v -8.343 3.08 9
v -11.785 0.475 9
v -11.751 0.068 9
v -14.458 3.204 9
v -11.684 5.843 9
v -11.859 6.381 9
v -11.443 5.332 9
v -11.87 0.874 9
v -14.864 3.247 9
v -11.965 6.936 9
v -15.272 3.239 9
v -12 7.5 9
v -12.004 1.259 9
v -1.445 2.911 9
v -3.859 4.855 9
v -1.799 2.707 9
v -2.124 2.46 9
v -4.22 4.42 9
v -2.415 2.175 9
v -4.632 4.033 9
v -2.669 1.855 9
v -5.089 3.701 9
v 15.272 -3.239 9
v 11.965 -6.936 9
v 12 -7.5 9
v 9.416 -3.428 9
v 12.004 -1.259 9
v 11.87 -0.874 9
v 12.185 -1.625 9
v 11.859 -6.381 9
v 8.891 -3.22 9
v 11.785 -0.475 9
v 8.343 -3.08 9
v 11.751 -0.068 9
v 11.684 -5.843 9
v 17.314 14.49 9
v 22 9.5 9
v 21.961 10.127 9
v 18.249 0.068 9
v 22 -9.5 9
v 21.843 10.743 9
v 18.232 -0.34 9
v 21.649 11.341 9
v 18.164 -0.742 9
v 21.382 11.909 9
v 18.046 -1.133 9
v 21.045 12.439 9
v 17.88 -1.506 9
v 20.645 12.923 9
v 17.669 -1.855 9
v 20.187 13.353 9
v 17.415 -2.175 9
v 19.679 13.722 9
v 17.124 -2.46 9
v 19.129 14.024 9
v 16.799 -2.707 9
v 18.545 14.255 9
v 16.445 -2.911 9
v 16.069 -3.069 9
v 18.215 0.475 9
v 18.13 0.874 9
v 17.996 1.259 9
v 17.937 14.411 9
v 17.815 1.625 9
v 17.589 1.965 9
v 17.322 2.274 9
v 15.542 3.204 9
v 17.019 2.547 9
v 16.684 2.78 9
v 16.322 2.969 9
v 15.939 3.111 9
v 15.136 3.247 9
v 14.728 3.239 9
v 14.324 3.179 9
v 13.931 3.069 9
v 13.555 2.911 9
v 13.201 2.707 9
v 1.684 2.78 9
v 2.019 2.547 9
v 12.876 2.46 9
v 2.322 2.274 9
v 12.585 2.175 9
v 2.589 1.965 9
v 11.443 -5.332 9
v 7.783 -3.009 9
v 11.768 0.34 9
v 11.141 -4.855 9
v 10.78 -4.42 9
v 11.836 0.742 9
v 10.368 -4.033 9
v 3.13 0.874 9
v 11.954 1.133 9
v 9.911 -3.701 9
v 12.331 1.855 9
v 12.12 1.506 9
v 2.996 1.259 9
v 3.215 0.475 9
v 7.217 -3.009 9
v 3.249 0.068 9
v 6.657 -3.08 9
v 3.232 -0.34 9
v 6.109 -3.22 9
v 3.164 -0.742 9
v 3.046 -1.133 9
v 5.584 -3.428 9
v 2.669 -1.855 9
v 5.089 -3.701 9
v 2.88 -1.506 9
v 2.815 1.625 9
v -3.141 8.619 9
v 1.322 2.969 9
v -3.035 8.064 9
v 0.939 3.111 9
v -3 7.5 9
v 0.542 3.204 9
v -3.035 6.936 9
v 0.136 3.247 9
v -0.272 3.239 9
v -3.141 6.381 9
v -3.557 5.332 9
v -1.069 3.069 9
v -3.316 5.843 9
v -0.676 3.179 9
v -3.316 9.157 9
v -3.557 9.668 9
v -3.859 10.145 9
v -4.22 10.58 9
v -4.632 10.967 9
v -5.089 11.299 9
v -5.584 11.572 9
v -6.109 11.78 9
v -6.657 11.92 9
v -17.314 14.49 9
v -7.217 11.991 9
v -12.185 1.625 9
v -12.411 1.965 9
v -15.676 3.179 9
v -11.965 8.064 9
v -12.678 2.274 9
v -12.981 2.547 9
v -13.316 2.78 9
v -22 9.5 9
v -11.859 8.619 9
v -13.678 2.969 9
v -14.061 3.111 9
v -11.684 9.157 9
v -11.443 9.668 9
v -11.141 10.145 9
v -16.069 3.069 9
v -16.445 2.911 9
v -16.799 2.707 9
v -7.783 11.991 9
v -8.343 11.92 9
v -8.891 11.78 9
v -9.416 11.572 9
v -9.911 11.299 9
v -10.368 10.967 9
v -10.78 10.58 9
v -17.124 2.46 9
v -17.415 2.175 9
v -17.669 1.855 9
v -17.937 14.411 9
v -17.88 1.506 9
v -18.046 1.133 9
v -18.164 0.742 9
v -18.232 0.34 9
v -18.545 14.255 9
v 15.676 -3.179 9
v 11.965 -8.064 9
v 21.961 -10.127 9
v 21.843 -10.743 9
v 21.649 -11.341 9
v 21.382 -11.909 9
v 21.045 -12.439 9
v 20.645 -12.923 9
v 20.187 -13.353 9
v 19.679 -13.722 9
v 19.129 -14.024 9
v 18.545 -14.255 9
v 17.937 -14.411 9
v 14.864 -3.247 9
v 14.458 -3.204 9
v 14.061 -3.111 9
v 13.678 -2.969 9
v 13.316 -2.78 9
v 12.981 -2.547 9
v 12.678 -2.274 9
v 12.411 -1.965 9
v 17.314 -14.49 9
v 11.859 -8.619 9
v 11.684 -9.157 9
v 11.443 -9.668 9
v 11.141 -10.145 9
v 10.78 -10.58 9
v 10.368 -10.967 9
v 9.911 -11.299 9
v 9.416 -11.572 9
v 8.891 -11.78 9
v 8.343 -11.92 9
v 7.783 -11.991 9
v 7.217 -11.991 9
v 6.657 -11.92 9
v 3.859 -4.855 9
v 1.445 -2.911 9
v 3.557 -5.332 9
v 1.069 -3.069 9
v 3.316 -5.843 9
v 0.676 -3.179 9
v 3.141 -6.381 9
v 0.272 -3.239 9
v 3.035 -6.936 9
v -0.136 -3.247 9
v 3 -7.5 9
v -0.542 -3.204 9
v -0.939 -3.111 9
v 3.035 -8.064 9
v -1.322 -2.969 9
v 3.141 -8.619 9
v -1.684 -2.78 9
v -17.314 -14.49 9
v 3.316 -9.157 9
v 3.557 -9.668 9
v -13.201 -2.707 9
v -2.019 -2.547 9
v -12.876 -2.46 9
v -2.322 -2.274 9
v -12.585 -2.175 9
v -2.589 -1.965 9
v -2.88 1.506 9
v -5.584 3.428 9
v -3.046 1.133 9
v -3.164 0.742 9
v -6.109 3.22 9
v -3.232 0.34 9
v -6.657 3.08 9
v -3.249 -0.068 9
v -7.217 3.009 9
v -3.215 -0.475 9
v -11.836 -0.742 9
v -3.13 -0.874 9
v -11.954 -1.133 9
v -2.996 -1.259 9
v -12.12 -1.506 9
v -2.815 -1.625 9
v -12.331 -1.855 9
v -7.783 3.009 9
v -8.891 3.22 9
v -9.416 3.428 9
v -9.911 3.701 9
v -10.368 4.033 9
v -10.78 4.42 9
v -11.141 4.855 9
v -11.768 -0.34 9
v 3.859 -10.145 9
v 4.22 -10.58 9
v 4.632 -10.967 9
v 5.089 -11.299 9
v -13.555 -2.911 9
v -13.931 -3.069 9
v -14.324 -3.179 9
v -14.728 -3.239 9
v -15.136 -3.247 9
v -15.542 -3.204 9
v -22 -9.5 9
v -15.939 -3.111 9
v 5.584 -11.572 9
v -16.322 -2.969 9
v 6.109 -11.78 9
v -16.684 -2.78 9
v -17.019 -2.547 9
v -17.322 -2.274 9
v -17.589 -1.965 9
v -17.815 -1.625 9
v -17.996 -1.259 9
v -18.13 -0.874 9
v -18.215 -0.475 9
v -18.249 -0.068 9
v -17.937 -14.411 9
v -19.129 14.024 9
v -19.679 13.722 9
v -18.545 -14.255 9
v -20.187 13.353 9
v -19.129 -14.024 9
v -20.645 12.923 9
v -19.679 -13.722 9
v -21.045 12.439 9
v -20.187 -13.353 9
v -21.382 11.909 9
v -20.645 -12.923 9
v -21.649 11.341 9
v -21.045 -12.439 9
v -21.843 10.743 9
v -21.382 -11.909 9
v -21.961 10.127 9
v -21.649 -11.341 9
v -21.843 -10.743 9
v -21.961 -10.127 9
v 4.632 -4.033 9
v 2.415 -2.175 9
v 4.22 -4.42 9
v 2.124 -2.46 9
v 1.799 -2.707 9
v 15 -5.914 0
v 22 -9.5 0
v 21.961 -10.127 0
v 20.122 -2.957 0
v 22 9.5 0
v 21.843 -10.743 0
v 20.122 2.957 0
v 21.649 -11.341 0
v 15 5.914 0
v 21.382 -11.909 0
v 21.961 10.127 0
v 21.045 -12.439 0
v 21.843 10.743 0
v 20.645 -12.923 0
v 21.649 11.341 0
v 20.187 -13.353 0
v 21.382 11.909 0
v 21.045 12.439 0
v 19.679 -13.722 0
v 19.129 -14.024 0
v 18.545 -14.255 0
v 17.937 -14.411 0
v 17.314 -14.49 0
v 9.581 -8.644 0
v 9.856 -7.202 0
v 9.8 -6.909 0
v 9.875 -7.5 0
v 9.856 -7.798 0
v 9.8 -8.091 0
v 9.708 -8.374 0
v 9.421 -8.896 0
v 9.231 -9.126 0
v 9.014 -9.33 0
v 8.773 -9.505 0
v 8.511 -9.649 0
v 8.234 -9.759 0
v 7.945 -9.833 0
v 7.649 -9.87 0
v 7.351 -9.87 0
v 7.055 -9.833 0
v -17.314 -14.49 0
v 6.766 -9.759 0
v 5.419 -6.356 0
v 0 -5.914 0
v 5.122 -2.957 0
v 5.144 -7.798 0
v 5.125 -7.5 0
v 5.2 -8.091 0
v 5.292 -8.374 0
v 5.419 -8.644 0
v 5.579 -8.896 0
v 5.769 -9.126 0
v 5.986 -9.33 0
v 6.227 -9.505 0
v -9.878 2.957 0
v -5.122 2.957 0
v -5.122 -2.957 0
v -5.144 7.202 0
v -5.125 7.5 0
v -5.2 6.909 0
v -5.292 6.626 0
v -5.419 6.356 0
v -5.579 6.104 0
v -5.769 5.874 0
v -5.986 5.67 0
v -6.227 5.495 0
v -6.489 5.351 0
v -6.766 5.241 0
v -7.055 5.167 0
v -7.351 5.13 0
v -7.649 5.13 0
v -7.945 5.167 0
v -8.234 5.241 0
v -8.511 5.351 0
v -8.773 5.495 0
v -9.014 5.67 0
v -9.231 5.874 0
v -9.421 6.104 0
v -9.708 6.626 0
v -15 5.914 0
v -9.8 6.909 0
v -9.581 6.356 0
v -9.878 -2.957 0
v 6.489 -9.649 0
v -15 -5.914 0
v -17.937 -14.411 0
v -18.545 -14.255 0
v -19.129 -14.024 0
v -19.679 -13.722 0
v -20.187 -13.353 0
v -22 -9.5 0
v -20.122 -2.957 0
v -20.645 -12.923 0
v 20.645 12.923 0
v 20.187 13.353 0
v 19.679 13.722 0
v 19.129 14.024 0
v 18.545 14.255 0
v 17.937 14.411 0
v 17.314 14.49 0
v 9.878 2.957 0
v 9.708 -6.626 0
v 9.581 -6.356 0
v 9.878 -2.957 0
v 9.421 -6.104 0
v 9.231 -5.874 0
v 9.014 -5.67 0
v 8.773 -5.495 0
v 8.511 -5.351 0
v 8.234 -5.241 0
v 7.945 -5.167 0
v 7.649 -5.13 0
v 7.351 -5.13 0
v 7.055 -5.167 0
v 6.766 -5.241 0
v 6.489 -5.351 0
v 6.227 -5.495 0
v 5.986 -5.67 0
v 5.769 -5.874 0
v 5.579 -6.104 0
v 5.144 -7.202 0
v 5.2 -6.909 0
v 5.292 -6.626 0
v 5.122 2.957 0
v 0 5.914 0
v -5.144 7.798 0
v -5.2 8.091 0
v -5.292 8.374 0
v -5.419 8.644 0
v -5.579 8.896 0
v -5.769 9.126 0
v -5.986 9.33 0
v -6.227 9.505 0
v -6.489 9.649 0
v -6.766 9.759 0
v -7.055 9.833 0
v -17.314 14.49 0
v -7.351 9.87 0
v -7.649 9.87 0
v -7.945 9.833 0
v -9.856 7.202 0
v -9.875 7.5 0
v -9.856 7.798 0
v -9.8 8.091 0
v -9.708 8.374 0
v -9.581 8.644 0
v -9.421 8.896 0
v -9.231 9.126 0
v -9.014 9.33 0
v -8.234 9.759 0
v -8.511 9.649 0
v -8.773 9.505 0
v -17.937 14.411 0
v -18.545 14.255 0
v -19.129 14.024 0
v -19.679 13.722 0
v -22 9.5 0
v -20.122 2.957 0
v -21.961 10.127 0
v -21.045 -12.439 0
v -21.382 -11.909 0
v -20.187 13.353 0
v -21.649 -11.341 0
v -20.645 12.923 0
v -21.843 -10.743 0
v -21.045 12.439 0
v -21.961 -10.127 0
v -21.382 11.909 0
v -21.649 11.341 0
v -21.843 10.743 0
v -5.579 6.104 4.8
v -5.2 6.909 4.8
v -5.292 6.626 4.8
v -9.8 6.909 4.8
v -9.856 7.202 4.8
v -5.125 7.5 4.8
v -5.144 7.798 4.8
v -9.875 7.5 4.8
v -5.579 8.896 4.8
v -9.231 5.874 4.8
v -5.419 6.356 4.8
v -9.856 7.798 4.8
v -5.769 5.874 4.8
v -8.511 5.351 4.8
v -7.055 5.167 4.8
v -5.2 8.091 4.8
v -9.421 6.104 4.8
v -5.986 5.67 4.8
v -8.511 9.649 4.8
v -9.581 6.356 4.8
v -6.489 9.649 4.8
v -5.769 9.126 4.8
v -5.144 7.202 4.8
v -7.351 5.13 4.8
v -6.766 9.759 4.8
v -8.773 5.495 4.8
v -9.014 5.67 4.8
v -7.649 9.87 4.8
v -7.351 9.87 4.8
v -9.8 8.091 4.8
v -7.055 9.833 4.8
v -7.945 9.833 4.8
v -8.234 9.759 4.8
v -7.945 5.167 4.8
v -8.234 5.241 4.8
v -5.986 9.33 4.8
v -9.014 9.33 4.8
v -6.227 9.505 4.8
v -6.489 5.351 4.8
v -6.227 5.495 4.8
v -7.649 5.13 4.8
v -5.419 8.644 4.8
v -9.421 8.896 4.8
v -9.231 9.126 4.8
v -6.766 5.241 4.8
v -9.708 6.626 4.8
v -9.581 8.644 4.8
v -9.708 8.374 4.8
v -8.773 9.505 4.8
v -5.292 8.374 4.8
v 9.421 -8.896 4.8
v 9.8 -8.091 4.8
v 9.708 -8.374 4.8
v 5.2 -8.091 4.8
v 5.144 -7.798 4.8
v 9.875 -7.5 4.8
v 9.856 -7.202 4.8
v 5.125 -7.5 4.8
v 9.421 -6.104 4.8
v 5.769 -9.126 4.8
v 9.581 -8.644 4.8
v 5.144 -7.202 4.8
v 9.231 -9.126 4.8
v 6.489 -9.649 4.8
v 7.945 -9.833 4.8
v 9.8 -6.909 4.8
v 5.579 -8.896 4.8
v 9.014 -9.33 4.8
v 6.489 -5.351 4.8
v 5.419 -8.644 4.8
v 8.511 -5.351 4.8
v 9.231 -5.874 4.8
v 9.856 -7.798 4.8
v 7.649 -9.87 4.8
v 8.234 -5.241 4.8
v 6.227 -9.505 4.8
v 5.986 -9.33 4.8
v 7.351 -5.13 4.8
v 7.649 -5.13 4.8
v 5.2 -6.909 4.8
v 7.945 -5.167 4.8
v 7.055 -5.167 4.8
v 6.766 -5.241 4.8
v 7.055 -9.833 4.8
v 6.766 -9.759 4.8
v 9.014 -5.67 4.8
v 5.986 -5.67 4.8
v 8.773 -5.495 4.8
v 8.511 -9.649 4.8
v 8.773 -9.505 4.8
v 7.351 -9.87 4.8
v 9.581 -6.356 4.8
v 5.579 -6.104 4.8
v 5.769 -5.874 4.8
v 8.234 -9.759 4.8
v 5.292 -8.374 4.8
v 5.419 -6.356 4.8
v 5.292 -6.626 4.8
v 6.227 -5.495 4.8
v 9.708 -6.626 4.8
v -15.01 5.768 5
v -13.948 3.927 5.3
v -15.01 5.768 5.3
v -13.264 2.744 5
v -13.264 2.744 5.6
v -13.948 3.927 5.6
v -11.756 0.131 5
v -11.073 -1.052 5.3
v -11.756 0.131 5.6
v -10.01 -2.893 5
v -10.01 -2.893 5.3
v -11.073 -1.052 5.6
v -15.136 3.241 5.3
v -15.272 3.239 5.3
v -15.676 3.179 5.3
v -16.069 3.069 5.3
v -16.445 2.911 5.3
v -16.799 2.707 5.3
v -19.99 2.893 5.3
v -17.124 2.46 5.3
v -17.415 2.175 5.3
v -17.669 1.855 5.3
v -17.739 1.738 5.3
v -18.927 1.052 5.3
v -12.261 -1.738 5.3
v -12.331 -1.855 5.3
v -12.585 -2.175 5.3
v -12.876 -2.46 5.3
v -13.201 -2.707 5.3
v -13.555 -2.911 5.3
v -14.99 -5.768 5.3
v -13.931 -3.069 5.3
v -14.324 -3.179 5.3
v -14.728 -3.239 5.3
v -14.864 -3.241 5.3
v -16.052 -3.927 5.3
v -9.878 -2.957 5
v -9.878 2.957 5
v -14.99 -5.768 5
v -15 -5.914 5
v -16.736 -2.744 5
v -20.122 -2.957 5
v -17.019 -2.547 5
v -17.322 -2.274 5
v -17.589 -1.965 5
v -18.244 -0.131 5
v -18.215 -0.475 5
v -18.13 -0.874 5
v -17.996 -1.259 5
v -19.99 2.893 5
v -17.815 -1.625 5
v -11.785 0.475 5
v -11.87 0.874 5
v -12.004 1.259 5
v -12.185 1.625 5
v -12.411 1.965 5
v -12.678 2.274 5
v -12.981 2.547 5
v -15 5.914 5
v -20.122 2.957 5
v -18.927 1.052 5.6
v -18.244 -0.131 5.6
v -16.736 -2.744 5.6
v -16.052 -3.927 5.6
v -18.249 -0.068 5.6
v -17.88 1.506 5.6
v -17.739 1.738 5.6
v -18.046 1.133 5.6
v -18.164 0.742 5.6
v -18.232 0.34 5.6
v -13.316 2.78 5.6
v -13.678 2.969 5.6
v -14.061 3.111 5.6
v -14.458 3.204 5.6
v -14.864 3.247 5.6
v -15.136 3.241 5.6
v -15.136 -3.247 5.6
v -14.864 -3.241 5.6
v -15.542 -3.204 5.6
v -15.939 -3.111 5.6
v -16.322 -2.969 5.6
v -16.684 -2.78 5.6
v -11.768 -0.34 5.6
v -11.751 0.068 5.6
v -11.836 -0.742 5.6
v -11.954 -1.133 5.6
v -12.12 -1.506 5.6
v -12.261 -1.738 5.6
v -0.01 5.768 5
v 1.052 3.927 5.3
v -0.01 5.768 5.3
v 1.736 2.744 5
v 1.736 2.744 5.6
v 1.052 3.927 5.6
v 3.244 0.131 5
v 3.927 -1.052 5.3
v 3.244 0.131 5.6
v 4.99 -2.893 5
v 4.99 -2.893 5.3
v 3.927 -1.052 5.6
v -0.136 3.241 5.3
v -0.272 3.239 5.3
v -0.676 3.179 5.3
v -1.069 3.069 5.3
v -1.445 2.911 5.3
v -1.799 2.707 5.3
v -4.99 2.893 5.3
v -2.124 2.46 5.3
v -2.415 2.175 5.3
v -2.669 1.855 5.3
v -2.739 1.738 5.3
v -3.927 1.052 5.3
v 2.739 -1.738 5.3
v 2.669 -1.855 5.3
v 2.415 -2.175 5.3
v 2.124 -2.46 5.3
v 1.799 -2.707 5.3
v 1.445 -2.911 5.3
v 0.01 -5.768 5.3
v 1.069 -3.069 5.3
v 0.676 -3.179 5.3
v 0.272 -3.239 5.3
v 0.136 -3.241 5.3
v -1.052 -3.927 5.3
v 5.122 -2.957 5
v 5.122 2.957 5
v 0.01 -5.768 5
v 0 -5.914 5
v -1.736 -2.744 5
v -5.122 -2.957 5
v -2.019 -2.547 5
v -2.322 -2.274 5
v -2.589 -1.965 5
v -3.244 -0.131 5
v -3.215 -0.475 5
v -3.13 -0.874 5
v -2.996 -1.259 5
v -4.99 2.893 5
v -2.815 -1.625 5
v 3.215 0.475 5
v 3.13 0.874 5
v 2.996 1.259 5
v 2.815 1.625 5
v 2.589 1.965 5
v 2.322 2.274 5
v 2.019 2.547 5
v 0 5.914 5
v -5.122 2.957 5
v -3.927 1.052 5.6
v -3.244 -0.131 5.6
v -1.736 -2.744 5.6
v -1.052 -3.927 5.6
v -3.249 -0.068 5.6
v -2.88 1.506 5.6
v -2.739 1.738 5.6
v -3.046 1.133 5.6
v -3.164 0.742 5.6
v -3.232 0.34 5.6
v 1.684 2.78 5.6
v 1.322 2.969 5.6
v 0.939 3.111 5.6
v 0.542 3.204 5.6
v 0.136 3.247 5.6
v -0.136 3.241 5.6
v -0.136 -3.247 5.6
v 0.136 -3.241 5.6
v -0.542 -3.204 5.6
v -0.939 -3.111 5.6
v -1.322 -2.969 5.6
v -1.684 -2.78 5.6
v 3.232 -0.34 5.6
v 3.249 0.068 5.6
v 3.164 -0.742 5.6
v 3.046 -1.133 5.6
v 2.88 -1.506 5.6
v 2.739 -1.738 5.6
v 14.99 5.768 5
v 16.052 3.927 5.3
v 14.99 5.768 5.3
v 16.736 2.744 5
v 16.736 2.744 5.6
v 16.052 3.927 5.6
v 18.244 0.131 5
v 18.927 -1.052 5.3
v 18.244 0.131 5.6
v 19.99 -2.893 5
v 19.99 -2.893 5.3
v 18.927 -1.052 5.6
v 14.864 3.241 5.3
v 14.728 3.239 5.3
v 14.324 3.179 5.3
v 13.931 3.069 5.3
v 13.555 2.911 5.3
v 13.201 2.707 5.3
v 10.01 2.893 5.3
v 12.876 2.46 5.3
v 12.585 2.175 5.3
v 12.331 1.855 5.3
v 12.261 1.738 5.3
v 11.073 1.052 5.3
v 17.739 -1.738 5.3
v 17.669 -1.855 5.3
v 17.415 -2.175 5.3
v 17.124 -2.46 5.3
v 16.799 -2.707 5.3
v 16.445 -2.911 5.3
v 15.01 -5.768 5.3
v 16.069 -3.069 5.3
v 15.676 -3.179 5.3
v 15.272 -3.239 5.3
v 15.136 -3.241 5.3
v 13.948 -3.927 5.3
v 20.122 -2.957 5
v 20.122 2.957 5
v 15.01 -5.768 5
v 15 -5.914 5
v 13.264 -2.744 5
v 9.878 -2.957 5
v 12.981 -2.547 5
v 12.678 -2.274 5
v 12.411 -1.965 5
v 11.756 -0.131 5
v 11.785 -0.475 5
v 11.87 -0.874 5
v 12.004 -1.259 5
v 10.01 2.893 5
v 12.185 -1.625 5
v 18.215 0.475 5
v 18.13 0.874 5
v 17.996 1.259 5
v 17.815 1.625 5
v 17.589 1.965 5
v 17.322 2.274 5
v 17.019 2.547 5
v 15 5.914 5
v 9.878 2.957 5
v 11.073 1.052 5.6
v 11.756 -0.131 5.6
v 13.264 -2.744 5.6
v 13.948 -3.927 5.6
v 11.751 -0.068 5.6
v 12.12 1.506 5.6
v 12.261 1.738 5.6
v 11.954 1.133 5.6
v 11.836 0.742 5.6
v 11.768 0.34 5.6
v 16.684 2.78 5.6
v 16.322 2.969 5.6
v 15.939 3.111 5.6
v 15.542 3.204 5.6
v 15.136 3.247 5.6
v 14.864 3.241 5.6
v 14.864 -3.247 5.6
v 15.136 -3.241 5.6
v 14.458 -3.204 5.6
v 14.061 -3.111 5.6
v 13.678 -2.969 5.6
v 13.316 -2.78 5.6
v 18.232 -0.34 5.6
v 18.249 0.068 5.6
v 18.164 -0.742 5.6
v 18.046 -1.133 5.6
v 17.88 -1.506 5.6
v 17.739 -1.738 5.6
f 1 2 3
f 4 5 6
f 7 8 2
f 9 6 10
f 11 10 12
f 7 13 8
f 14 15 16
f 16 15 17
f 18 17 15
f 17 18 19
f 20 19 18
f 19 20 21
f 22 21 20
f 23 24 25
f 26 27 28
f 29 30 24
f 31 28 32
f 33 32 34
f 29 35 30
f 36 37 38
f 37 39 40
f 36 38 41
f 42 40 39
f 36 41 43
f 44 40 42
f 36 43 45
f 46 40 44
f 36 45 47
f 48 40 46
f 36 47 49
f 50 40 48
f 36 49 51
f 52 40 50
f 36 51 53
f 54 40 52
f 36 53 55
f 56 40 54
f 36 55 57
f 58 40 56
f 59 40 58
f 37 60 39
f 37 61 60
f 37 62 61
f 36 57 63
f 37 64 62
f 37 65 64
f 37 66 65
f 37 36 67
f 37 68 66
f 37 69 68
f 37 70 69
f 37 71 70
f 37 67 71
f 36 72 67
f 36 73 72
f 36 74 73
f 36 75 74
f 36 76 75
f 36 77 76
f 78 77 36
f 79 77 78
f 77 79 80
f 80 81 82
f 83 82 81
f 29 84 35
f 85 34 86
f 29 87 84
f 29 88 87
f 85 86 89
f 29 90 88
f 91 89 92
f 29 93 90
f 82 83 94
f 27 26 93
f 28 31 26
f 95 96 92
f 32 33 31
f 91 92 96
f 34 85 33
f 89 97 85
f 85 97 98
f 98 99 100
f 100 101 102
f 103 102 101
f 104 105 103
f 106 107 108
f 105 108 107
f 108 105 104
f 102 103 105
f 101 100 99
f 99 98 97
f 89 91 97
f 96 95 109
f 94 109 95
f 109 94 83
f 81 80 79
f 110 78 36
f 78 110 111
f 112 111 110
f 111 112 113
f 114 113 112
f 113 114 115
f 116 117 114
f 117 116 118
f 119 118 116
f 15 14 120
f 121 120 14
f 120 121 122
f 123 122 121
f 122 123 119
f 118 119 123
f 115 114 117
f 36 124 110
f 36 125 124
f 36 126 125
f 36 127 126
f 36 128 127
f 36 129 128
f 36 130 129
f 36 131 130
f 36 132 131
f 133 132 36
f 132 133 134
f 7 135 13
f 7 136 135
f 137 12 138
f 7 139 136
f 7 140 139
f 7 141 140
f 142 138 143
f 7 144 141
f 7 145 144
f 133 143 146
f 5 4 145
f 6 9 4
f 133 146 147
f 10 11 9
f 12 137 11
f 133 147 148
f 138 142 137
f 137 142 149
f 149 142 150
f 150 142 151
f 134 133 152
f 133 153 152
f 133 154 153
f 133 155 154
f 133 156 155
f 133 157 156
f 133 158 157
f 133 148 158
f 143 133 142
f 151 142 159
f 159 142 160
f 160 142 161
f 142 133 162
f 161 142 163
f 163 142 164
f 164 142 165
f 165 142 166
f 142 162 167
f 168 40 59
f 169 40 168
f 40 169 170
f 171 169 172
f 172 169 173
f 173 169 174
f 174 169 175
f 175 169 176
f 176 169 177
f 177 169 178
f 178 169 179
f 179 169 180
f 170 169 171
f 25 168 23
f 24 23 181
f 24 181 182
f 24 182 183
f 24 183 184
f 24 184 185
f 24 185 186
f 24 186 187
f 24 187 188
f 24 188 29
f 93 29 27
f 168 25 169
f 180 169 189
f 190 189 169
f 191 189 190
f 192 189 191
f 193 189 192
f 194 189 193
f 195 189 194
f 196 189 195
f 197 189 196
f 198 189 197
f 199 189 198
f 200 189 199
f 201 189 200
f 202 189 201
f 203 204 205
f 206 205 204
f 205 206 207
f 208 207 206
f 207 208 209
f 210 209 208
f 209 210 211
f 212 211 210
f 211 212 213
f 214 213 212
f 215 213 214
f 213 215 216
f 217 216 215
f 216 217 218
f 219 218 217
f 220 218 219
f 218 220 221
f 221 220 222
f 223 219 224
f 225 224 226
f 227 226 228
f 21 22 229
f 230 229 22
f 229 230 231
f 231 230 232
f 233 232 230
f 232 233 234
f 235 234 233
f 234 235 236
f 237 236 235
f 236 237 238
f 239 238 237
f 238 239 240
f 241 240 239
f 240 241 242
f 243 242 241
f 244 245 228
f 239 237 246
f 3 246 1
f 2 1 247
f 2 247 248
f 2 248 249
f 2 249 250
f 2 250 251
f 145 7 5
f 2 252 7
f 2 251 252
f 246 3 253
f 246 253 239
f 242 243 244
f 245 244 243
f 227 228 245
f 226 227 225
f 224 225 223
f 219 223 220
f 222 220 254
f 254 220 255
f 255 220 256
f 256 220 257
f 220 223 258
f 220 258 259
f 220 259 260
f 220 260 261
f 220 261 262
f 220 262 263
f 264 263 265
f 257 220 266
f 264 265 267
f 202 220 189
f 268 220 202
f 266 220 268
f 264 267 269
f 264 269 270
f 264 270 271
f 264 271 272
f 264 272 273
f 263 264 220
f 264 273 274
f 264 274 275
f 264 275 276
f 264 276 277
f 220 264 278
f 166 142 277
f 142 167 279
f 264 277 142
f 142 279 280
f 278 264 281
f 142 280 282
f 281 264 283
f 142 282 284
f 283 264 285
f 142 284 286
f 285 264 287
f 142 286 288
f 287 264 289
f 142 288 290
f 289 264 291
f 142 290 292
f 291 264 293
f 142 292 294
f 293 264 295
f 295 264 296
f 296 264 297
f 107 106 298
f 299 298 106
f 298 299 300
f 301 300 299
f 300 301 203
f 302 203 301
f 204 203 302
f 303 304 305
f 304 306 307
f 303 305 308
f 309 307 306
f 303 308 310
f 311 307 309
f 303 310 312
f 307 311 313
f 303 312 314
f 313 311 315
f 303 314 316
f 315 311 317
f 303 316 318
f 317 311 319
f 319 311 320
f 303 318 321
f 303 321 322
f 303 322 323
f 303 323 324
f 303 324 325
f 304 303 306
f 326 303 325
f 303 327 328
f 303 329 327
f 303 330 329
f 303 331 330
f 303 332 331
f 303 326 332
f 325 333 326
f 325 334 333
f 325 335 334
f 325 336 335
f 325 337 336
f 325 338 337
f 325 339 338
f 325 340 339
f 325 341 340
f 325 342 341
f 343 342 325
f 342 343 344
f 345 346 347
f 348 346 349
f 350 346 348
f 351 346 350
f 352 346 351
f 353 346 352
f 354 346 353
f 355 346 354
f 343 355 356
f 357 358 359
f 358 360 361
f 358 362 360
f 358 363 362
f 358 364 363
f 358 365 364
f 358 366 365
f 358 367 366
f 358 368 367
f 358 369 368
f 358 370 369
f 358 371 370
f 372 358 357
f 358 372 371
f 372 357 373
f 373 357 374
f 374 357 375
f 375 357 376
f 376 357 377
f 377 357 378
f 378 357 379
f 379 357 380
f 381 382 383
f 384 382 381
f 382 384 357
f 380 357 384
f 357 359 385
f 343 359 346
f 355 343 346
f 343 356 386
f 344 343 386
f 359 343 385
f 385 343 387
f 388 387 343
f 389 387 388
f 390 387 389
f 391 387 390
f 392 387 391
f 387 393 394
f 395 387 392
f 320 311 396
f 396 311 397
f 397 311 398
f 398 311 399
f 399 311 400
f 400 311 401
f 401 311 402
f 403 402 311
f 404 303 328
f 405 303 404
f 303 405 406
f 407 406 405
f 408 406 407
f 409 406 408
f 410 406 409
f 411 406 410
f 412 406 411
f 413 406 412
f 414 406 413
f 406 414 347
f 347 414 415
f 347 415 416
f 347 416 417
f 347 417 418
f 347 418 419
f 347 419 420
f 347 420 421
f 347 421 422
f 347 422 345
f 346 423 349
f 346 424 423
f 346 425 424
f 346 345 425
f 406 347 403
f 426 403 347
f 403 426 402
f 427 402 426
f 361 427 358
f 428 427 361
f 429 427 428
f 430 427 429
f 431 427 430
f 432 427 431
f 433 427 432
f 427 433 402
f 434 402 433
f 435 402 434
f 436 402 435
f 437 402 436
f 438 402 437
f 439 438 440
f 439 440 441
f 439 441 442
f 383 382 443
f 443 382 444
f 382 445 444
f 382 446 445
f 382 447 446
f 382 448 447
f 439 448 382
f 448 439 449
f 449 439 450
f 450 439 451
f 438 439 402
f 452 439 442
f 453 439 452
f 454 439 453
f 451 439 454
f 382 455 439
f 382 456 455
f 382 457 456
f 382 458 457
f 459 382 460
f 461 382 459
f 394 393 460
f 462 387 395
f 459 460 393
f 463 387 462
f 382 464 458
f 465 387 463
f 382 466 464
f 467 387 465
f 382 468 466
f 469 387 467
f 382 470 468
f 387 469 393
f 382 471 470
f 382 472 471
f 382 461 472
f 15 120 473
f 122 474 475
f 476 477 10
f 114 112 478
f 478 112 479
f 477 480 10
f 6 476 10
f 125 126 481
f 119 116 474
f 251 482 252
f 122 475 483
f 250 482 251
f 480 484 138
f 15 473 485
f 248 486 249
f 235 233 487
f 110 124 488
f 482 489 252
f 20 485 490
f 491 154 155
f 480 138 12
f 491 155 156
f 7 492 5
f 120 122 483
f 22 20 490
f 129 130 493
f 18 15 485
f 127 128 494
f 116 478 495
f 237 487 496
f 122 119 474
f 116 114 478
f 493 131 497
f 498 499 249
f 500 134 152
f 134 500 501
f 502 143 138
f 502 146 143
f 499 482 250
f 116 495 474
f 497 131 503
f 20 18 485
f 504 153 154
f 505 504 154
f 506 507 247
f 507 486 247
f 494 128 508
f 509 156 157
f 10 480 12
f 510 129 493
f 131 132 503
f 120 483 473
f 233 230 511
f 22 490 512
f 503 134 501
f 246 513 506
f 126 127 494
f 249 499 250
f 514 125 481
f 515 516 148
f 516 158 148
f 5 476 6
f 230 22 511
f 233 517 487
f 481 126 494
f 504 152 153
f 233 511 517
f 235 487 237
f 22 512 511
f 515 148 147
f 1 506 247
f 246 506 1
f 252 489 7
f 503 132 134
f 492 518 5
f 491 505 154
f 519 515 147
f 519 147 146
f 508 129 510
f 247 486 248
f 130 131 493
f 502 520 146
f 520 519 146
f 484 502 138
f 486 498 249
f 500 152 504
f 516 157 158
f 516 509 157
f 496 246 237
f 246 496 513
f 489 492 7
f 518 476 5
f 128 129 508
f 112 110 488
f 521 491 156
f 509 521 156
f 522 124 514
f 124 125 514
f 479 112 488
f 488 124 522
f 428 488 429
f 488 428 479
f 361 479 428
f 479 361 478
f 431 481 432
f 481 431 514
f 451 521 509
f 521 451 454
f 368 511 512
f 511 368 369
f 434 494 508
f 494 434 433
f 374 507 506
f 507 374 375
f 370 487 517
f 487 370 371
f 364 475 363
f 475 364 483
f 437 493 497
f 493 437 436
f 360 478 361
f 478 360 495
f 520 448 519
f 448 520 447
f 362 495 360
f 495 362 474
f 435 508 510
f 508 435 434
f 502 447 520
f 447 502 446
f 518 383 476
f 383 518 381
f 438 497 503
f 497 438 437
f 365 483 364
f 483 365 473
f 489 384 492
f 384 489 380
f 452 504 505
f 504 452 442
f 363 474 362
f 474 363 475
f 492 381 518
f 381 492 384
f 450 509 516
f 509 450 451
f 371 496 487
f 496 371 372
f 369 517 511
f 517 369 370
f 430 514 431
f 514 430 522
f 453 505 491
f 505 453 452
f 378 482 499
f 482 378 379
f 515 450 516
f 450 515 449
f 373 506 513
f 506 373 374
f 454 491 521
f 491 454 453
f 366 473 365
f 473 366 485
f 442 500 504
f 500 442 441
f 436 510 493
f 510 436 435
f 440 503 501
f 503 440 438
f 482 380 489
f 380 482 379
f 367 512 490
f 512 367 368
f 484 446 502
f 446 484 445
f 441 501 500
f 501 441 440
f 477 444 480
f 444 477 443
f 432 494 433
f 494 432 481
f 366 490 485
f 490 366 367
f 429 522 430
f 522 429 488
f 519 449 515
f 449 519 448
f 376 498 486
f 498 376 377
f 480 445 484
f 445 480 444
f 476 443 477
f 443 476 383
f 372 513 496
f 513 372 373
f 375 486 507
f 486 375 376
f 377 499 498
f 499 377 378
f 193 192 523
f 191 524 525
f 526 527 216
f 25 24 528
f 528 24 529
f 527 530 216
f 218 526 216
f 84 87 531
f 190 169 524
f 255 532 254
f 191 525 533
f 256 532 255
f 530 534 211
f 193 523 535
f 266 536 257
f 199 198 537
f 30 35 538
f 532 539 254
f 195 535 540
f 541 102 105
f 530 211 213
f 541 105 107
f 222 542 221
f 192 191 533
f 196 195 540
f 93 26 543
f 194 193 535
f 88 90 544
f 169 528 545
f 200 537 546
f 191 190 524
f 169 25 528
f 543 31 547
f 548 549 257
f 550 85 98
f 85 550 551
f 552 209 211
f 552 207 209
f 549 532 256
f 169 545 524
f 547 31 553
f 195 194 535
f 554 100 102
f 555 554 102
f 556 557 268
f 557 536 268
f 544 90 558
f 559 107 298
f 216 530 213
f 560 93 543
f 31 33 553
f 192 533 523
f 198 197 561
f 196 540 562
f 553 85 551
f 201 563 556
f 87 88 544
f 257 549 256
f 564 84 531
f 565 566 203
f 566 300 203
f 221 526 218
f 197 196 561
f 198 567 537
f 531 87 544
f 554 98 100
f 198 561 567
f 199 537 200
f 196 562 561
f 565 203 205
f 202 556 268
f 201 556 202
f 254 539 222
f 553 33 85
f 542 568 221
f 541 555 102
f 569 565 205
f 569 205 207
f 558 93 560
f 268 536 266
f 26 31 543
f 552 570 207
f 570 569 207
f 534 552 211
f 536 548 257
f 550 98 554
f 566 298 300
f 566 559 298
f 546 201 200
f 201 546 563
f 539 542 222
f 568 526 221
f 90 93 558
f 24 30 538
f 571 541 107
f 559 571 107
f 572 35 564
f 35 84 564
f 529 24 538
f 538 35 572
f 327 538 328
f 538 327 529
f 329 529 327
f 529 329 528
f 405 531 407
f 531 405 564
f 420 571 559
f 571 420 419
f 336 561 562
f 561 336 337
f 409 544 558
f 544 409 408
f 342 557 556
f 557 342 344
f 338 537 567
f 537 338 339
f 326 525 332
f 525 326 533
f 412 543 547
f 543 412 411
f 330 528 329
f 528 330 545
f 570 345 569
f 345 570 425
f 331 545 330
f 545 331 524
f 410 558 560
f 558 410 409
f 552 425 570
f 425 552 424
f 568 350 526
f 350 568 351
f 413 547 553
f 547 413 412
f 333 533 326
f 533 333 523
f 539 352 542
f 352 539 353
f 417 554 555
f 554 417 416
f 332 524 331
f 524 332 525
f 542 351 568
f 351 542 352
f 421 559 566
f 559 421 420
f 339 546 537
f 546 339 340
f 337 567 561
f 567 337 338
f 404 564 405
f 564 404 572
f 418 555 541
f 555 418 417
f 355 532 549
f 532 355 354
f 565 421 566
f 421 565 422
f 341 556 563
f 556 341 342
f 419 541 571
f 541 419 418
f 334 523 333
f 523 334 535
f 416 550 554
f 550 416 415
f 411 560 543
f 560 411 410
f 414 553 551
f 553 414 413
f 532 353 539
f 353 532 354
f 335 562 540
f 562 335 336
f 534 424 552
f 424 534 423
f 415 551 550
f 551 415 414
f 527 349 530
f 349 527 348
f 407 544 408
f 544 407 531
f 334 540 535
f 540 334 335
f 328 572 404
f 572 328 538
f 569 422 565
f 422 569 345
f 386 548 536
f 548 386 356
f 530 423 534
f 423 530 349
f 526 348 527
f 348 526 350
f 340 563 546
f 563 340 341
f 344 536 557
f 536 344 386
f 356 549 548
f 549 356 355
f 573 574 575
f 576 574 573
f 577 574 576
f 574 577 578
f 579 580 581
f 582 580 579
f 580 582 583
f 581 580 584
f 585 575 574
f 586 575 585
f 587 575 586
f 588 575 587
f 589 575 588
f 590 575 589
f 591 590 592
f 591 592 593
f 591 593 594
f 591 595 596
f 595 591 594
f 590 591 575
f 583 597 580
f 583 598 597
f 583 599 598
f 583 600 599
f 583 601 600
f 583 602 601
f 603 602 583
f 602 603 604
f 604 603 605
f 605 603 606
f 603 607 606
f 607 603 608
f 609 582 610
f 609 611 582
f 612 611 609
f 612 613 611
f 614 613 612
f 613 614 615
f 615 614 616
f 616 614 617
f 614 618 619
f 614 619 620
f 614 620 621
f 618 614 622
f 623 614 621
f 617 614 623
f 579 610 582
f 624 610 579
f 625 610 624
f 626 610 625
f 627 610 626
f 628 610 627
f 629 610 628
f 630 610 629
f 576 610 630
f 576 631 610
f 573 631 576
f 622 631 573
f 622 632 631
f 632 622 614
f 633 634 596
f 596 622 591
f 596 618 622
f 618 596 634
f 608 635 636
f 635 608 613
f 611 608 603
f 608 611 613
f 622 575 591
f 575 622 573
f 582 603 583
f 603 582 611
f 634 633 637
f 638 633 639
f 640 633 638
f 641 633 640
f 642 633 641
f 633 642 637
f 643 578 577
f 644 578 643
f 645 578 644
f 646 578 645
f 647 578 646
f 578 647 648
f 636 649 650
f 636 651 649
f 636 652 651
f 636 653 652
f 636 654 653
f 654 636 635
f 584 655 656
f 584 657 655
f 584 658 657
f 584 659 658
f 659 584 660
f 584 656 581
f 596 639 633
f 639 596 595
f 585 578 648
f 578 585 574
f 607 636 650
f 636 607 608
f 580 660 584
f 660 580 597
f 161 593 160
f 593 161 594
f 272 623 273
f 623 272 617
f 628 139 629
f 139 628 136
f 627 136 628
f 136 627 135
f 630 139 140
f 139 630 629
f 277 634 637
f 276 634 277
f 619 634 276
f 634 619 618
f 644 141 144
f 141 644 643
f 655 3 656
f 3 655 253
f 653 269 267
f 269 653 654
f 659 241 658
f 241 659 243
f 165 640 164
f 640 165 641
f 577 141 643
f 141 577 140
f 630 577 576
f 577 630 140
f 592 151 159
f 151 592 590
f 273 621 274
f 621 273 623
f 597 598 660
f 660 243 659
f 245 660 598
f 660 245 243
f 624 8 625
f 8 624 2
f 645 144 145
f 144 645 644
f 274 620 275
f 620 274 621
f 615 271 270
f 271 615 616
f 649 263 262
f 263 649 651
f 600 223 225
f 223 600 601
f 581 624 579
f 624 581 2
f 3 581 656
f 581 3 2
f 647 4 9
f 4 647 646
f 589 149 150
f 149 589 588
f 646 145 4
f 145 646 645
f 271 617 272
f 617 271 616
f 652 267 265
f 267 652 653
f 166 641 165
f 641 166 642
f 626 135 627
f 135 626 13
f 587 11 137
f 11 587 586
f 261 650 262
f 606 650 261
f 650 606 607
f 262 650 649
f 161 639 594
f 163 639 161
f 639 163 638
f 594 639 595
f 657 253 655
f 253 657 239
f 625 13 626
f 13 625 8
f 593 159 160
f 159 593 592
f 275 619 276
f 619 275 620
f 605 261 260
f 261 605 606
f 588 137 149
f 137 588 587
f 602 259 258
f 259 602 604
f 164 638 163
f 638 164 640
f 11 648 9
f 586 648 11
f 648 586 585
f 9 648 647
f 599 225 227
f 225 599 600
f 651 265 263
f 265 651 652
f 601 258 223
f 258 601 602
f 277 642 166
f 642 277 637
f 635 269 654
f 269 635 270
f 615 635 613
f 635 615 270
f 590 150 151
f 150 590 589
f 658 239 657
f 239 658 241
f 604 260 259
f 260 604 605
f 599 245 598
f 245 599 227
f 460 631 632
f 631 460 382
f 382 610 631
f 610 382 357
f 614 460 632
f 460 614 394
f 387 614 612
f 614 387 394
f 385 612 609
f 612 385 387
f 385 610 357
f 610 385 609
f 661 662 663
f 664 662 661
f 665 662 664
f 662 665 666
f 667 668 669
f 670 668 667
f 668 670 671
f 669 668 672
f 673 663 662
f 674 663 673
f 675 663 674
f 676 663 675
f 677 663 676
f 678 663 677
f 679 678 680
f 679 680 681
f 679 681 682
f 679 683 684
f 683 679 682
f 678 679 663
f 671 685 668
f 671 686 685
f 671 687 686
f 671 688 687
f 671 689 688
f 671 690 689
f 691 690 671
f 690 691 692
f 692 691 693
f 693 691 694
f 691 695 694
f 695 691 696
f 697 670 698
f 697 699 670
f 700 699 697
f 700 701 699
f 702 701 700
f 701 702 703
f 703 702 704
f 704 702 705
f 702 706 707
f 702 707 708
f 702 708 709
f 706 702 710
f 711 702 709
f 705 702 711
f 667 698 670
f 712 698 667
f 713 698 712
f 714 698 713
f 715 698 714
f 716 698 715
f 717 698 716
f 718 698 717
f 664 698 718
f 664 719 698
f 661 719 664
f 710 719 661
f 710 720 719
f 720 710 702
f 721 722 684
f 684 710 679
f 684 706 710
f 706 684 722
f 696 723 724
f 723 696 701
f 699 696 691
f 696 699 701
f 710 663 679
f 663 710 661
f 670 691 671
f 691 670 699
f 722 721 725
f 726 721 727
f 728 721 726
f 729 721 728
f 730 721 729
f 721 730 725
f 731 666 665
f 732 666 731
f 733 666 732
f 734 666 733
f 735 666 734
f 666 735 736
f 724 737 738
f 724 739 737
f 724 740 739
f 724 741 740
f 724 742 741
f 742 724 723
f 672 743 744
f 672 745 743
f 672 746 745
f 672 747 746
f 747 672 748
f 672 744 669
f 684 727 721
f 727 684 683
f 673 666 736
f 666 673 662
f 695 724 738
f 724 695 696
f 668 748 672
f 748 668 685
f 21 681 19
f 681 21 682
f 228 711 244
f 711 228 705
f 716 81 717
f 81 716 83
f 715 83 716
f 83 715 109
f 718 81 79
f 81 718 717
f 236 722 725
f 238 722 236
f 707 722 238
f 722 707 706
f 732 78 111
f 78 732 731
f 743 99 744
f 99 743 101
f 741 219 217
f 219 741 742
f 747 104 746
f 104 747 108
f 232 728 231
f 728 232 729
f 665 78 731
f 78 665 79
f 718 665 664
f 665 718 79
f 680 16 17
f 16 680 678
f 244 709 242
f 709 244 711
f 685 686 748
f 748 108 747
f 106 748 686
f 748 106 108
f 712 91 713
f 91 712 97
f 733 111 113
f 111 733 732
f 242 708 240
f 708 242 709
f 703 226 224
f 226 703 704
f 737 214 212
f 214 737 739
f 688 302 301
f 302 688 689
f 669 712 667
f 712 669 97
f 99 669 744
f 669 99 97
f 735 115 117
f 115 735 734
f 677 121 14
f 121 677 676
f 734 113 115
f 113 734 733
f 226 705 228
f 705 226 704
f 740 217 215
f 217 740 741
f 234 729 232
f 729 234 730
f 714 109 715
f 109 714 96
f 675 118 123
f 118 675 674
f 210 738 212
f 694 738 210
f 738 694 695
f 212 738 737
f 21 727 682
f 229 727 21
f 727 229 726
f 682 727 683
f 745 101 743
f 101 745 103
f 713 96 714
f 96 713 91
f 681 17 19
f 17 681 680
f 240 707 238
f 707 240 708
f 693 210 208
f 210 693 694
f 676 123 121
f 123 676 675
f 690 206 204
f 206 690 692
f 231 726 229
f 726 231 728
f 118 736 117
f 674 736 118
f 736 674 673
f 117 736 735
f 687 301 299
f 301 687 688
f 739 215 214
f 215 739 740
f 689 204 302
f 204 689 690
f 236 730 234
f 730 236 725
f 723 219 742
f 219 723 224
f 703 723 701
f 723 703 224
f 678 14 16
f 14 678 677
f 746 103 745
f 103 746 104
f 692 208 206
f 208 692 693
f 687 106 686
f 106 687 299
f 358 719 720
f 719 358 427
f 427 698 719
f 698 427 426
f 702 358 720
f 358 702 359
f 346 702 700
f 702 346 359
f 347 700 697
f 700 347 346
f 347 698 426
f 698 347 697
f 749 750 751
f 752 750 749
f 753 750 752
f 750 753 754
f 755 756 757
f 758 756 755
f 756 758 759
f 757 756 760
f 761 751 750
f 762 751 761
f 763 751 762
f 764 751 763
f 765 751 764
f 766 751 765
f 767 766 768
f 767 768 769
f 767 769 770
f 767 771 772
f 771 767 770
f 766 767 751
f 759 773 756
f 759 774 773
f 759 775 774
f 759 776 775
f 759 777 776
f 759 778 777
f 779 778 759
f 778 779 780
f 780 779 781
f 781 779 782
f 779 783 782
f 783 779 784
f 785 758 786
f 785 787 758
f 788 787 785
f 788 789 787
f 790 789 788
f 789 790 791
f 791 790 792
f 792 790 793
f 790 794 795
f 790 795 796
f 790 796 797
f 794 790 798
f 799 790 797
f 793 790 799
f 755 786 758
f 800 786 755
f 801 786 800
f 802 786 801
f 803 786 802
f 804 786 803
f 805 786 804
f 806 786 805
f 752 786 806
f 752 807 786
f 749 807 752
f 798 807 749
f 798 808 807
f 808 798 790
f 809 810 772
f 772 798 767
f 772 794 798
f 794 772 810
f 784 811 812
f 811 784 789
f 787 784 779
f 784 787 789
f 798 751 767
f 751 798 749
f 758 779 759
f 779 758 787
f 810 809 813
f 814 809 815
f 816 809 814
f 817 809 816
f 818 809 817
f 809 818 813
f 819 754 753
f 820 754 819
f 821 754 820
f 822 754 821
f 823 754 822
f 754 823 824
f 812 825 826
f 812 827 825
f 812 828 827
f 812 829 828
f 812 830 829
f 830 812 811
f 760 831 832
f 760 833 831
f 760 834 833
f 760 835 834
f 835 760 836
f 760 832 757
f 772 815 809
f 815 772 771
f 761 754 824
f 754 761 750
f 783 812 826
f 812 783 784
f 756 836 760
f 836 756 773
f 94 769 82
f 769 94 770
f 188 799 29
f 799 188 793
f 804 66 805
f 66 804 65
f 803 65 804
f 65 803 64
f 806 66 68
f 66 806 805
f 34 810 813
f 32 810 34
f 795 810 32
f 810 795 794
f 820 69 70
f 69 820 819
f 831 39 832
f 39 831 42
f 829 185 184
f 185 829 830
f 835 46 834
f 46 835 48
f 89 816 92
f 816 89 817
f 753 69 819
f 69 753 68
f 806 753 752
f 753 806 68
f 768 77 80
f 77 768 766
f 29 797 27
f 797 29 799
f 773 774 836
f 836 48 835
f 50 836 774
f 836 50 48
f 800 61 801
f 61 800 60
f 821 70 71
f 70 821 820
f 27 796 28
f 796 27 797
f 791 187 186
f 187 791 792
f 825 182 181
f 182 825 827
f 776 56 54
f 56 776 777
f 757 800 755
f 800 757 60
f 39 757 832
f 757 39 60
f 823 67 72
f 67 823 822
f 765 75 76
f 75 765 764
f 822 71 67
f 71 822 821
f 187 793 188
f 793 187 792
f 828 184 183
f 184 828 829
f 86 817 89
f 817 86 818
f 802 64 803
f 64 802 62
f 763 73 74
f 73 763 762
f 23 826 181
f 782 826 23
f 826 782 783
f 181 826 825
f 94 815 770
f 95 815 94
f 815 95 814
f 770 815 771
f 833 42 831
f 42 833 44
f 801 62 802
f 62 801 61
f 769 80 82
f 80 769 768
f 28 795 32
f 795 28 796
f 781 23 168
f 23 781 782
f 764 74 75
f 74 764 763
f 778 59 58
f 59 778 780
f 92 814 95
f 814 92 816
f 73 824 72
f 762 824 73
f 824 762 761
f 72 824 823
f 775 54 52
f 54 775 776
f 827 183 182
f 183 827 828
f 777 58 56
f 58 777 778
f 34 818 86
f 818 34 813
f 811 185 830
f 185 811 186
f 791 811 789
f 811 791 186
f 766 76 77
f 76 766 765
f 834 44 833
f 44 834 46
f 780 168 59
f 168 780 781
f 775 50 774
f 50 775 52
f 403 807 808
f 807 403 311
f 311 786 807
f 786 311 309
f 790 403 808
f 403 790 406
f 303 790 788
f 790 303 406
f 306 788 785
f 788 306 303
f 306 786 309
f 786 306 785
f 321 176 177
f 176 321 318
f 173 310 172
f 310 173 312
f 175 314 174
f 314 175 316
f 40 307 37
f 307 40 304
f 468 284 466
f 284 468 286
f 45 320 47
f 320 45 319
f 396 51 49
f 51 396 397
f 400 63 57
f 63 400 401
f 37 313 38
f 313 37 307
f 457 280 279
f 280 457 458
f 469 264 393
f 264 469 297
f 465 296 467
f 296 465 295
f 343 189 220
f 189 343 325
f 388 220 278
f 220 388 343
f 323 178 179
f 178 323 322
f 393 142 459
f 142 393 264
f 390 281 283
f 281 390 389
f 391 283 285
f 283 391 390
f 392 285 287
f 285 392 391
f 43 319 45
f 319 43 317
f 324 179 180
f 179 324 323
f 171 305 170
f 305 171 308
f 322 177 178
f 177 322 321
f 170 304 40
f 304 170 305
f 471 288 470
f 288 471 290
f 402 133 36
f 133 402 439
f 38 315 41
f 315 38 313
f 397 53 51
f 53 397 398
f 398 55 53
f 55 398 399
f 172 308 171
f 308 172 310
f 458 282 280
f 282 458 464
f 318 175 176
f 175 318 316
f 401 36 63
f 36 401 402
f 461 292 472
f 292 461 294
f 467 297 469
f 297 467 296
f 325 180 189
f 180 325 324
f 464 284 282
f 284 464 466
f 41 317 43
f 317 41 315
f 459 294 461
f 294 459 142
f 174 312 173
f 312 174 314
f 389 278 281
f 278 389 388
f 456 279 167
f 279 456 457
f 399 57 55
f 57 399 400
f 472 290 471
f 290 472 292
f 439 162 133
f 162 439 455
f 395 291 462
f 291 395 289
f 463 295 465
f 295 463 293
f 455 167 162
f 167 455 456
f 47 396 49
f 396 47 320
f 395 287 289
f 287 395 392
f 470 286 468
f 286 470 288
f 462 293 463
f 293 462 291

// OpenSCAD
$fn = 50;


difference() {
	union() {
		hull() {
			translate(v = [-17.0000000000, 9.5000000000, 0]) {
				cylinder(h = 9, r = 5);
			}
			translate(v = [17.0000000000, 9.5000000000, 0]) {
				cylinder(h = 9, r = 5);
			}
			translate(v = [-17.0000000000, -9.5000000000, 0]) {
				cylinder(h = 9, r = 5);
			}
			translate(v = [17.0000000000, -9.5000000000, 0]) {
				cylinder(h = 9, r = 5);
			}
		}
	}
	union() {
		translate(v = [-7.5000000000, 7.5000000000, 9]) {
			rotate(a = [0, 0, 0]) {
				difference() {
					union() {
						translate(v = [0, 0, -9.0000000000]) {
							cylinder(h = 9, r = 2.2500000000);
						}
						translate(v = [0, 0, -4.2000000000]) {
							cylinder(h = 4.2000000000, r1 = 2.3750000000, r2 = 4.5000000000);
						}
						translate(v = [0, 0, -9.0000000000]) {
							cylinder(h = 9, r = 2.3750000000);
						}
						translate(v = [0, 0, -9.0000000000]) {
							cylinder(h = 9, r = 2.2500000000);
						}
					}
					union();
				}
			}
		}
		translate(v = [7.5000000000, -7.5000000000, 9]) {
			rotate(a = [0, 0, 0]) {
				difference() {
					union() {
						translate(v = [0, 0, -9.0000000000]) {
							cylinder(h = 9, r = 2.2500000000);
						}
						translate(v = [0, 0, -4.2000000000]) {
							cylinder(h = 4.2000000000, r1 = 2.3750000000, r2 = 4.5000000000);
						}
						translate(v = [0, 0, -9.0000000000]) {
							cylinder(h = 9, r = 2.3750000000);
						}
						translate(v = [0, 0, -9.0000000000]) {
							cylinder(h = 9, r = 2.2500000000);
						}
					}
					union();
				}
			}
		}
		translate(v = [-15.0000000000, 0, 0]) {
			rotate(a = [0, 0, 30.0000000000]) {
				difference() {
					union() {
						translate(v = [-2.8750000000, -5.0000000000, -0.3000000000]) {
							cube(size = [5.7500000000, 10, 0.3000000000]);
						}
						translate(v = [-2.8750000000, -2.8750000000, -0.6000000000]) {
							cube(size = [5.7500000000, 5.7500000000, 0.3000000000]);
						}
						translate(v = [-2.8750000000, -5.0000000000, 5]) {
							cube(size = [5.7500000000, 10, 0.3000000000]);
						}
						translate(v = [-2.8750000000, -2.8750000000, 5.3000000000]) {
							cube(size = [5.7500000000, 5.7500000000, 0.3000000000]);
						}
						translate(v = [0, 0, -100.0000000000]) {
							cylinder(h = 200, r = 3.2500000000);
						}
						linear_extrude(height = 5) {
							polygon(points = [[5.9142500000, 0.0000000000], [2.9571250000, 5.1218907443], [-2.9571250000, 5.1218907443], [-5.9142500000, 0.0000000000], [-2.9571250000, -5.1218907443], [2.9571250000, -5.1218907443]]);
						}
						translate(v = [-2.8750000000, -5.0000000000, -0.3000000000]) {
							cube(size = [5.7500000000, 10, 0.3000000000]);
						}
						translate(v = [-2.8750000000, -2.8750000000, -0.6000000000]) {
							cube(size = [5.7500000000, 5.7500000000, 0.3000000000]);
						}
						translate(v = [-2.8750000000, -5.0000000000, 5]) {
							cube(size = [5.7500000000, 10, 0.3000000000]);
						}
						translate(v = [-2.8750000000, -2.8750000000, 5.3000000000]) {
							cube(size = [5.7500000000, 5.7500000000, 0.3000000000]);
						}
						translate(v = [0, 0, -100.0000000000]) {
							cylinder(h = 200, r = 3.2500000000);
						}
						translate(v = [-2.8750000000, -5.0000000000, -0.3000000000]) {
							cube(size = [5.7500000000, 10, 0.3000000000]);
						}
						translate(v = [-2.8750000000, -2.8750000000, -0.6000000000]) {
							cube(size = [5.7500000000, 5.7500000000, 0.3000000000]);
						}
						translate(v = [-2.8750000000, -5.0000000000, 5]) {
							cube(size = [5.7500000000, 10, 0.3000000000]);
						}
						translate(v = [-2.8750000000, -2.8750000000, 5.3000000000]) {
							cube(size = [5.7500000000, 5.7500000000, 0.3000000000]);
						}
						translate(v = [0, 0, -100.0000000000]) {
							cylinder(h = 200, r = 3.2500000000);
						}
					}
					union();
				}
			}
		}
		translate(v = [0.0000000000, 0, 0]) {
			rotate(a = [0, 0, 30.0000000000]) {
				difference() {
					union() {
						translate(v = [-2.8750000000, -5.0000000000, -0.3000000000]) {
							cube(size = [5.7500000000, 10, 0.3000000000]);
						}
						translate(v = [-2.8750000000, -2.8750000000, -0.6000000000]) {
							cube(size = [5.7500000000, 5.7500000000, 0.3000000000]);
						}
						translate(v = [-2.8750000000, -5.0000000000, 5]) {
							cube(size = [5.7500000000, 10, 0.3000000000]);
						}
						translate(v = [-2.8750000000, -2.8750000000, 5.3000000000]) {
							cube(size = [5.7500000000, 5.7500000000, 0.3000000000]);
						}
						translate(v = [0, 0, -100.0000000000]) {
							cylinder(h = 200, r = 3.2500000000);
						}
						linear_extrude(height = 5) {
							polygon(points = [[5.9142500000, 0.0000000000], [2.9571250000, 5.1218907443], [-2.9571250000, 5.1218907443], [-5.9142500000, 0.0000000000], [-2.9571250000, -5.1218907443], [2.9571250000, -5.1218907443]]);
						}
						translate(v = [-2.8750000000, -5.0000000000, -0.3000000000]) {
							cube(size = [5.7500000000, 10, 0.3000000000]);
						}
						translate(v = [-2.8750000000, -2.8750000000, -0.6000000000]) {
							cube(size = [5.7500000000, 5.7500000000, 0.3000000000]);
						}
						translate(v = [-2.8750000000, -5.0000000000, 5]) {
							cube(size = [5.7500000000, 10, 0.3000000000]);
						}
						translate(v = [-2.8750000000, -2.8750000000, 5.3000000000]) {
							cube(size = [5.7500000000, 5.7500000000, 0.3000000000]);
						}
						translate(v = [0, 0, -100.0000000000]) {
							cylinder(h = 200, r = 3.2500000000);
						}
						translate(v = [-2.8750000000, -5.0000000000, -0.3000000000]) {
							cube(size = [5.7500000000, 10, 0.3000000000]);
						}
						translate(v = [-2.8750000000, -2.8750000000, -0.6000000000]) {
							cube(size = [5.7500000000, 5.7500000000, 0.3000000000]);
						}
						translate(v = [-2.8750000000, -5.0000000000, 5]) {
							cube(size = [5.7500000000, 10, 0.3000000000]);
						}
						translate(v = [-2.8750000000, -2.8750000000, 5.3000000000]) {
							cube(size = [5.7500000000, 5.7500000000, 0.3000000000]);
						}
						translate(v = [0, 0, -100.0000000000]) {
							cylinder(h = 200, r = 3.2500000000);
						}
					}
					union();
				}
			}
		}
		translate(v = [15.0000000000, 0, 0]) {
			rotate(a = [0, 0, 30.0000000000]) {
				difference() {
					union() {
						translate(v = [-2.8750000000, -5.0000000000, -0.3000000000]) {
							cube(size = [5.7500000000, 10, 0.3000000000]);
						}
						translate(v = [-2.8750000000, -2.8750000000, -0.6000000000]) {
							cube(size = [5.7500000000, 5.7500000000, 0.3000000000]);
						}
						translate(v = [-2.8750000000, -5.0000000000, 5]) {
							cube(size = [5.7500000000, 10, 0.3000000000]);
						}
						translate(v = [-2.8750000000, -2.8750000000, 5.3000000000]) {
							cube(size = [5.7500000000, 5.7500000000, 0.3000000000]);
						}
						translate(v = [0, 0, -100.0000000000]) {
							cylinder(h = 200, r = 3.2500000000);
						}
						linear_extrude(height = 5) {
							polygon(points = [[5.9142500000, 0.0000000000], [2.9571250000, 5.1218907443], [-2.9571250000, 5.1218907443], [-5.9142500000, 0.0000000000], [-2.9571250000, -5.1218907443], [2.9571250000, -5.1218907443]]);
						}
						translate(v = [-2.8750000000, -5.0000000000, -0.3000000000]) {
							cube(size = [5.7500000000, 10, 0.3000000000]);
						}
						translate(v = [-2.8750000000, -2.8750000000, -0.6000000000]) {
							cube(size = [5.7500000000, 5.7500000000, 0.3000000000]);
						}
						translate(v = [-2.8750000000, -5.0000000000, 5]) {
							cube(size = [5.7500000000, 10, 0.3000000000]);
						}
						translate(v = [-2.8750000000, -2.8750000000, 5.3000000000]) {
							cube(size = [5.7500000000, 5.7500000000, 0.3000000000]);
						}
						translate(v = [0, 0, -100.0000000000]) {
							cylinder(h = 200, r = 3.2500000000);
						}
						translate(v = [-2.8750000000, -5.0000000000, -0.3000000000]) {
							cube(size = [5.7500000000, 10, 0.3000000000]);
						}
						translate(v = [-2.8750000000, -2.8750000000, -0.6000000000]) {
							cube(size = [5.7500000000, 5.7500000000, 0.3000000000]);
						}
						translate(v = [-2.8750000000, -5.0000000000, 5]) {
							cube(size = [5.7500000000, 10, 0.3000000000]);
						}
						translate(v = [-2.8750000000, -2.8750000000, 5.3000000000]) {
							cube(size = [5.7500000000, 5.7500000000, 0.3000000000]);
						}
						translate(v = [0, 0, -100.0000000000]) {
							cylinder(h = 200, r = 3.2500000000);
						}
					}
					union();
				}
			}
		}
	}
}
